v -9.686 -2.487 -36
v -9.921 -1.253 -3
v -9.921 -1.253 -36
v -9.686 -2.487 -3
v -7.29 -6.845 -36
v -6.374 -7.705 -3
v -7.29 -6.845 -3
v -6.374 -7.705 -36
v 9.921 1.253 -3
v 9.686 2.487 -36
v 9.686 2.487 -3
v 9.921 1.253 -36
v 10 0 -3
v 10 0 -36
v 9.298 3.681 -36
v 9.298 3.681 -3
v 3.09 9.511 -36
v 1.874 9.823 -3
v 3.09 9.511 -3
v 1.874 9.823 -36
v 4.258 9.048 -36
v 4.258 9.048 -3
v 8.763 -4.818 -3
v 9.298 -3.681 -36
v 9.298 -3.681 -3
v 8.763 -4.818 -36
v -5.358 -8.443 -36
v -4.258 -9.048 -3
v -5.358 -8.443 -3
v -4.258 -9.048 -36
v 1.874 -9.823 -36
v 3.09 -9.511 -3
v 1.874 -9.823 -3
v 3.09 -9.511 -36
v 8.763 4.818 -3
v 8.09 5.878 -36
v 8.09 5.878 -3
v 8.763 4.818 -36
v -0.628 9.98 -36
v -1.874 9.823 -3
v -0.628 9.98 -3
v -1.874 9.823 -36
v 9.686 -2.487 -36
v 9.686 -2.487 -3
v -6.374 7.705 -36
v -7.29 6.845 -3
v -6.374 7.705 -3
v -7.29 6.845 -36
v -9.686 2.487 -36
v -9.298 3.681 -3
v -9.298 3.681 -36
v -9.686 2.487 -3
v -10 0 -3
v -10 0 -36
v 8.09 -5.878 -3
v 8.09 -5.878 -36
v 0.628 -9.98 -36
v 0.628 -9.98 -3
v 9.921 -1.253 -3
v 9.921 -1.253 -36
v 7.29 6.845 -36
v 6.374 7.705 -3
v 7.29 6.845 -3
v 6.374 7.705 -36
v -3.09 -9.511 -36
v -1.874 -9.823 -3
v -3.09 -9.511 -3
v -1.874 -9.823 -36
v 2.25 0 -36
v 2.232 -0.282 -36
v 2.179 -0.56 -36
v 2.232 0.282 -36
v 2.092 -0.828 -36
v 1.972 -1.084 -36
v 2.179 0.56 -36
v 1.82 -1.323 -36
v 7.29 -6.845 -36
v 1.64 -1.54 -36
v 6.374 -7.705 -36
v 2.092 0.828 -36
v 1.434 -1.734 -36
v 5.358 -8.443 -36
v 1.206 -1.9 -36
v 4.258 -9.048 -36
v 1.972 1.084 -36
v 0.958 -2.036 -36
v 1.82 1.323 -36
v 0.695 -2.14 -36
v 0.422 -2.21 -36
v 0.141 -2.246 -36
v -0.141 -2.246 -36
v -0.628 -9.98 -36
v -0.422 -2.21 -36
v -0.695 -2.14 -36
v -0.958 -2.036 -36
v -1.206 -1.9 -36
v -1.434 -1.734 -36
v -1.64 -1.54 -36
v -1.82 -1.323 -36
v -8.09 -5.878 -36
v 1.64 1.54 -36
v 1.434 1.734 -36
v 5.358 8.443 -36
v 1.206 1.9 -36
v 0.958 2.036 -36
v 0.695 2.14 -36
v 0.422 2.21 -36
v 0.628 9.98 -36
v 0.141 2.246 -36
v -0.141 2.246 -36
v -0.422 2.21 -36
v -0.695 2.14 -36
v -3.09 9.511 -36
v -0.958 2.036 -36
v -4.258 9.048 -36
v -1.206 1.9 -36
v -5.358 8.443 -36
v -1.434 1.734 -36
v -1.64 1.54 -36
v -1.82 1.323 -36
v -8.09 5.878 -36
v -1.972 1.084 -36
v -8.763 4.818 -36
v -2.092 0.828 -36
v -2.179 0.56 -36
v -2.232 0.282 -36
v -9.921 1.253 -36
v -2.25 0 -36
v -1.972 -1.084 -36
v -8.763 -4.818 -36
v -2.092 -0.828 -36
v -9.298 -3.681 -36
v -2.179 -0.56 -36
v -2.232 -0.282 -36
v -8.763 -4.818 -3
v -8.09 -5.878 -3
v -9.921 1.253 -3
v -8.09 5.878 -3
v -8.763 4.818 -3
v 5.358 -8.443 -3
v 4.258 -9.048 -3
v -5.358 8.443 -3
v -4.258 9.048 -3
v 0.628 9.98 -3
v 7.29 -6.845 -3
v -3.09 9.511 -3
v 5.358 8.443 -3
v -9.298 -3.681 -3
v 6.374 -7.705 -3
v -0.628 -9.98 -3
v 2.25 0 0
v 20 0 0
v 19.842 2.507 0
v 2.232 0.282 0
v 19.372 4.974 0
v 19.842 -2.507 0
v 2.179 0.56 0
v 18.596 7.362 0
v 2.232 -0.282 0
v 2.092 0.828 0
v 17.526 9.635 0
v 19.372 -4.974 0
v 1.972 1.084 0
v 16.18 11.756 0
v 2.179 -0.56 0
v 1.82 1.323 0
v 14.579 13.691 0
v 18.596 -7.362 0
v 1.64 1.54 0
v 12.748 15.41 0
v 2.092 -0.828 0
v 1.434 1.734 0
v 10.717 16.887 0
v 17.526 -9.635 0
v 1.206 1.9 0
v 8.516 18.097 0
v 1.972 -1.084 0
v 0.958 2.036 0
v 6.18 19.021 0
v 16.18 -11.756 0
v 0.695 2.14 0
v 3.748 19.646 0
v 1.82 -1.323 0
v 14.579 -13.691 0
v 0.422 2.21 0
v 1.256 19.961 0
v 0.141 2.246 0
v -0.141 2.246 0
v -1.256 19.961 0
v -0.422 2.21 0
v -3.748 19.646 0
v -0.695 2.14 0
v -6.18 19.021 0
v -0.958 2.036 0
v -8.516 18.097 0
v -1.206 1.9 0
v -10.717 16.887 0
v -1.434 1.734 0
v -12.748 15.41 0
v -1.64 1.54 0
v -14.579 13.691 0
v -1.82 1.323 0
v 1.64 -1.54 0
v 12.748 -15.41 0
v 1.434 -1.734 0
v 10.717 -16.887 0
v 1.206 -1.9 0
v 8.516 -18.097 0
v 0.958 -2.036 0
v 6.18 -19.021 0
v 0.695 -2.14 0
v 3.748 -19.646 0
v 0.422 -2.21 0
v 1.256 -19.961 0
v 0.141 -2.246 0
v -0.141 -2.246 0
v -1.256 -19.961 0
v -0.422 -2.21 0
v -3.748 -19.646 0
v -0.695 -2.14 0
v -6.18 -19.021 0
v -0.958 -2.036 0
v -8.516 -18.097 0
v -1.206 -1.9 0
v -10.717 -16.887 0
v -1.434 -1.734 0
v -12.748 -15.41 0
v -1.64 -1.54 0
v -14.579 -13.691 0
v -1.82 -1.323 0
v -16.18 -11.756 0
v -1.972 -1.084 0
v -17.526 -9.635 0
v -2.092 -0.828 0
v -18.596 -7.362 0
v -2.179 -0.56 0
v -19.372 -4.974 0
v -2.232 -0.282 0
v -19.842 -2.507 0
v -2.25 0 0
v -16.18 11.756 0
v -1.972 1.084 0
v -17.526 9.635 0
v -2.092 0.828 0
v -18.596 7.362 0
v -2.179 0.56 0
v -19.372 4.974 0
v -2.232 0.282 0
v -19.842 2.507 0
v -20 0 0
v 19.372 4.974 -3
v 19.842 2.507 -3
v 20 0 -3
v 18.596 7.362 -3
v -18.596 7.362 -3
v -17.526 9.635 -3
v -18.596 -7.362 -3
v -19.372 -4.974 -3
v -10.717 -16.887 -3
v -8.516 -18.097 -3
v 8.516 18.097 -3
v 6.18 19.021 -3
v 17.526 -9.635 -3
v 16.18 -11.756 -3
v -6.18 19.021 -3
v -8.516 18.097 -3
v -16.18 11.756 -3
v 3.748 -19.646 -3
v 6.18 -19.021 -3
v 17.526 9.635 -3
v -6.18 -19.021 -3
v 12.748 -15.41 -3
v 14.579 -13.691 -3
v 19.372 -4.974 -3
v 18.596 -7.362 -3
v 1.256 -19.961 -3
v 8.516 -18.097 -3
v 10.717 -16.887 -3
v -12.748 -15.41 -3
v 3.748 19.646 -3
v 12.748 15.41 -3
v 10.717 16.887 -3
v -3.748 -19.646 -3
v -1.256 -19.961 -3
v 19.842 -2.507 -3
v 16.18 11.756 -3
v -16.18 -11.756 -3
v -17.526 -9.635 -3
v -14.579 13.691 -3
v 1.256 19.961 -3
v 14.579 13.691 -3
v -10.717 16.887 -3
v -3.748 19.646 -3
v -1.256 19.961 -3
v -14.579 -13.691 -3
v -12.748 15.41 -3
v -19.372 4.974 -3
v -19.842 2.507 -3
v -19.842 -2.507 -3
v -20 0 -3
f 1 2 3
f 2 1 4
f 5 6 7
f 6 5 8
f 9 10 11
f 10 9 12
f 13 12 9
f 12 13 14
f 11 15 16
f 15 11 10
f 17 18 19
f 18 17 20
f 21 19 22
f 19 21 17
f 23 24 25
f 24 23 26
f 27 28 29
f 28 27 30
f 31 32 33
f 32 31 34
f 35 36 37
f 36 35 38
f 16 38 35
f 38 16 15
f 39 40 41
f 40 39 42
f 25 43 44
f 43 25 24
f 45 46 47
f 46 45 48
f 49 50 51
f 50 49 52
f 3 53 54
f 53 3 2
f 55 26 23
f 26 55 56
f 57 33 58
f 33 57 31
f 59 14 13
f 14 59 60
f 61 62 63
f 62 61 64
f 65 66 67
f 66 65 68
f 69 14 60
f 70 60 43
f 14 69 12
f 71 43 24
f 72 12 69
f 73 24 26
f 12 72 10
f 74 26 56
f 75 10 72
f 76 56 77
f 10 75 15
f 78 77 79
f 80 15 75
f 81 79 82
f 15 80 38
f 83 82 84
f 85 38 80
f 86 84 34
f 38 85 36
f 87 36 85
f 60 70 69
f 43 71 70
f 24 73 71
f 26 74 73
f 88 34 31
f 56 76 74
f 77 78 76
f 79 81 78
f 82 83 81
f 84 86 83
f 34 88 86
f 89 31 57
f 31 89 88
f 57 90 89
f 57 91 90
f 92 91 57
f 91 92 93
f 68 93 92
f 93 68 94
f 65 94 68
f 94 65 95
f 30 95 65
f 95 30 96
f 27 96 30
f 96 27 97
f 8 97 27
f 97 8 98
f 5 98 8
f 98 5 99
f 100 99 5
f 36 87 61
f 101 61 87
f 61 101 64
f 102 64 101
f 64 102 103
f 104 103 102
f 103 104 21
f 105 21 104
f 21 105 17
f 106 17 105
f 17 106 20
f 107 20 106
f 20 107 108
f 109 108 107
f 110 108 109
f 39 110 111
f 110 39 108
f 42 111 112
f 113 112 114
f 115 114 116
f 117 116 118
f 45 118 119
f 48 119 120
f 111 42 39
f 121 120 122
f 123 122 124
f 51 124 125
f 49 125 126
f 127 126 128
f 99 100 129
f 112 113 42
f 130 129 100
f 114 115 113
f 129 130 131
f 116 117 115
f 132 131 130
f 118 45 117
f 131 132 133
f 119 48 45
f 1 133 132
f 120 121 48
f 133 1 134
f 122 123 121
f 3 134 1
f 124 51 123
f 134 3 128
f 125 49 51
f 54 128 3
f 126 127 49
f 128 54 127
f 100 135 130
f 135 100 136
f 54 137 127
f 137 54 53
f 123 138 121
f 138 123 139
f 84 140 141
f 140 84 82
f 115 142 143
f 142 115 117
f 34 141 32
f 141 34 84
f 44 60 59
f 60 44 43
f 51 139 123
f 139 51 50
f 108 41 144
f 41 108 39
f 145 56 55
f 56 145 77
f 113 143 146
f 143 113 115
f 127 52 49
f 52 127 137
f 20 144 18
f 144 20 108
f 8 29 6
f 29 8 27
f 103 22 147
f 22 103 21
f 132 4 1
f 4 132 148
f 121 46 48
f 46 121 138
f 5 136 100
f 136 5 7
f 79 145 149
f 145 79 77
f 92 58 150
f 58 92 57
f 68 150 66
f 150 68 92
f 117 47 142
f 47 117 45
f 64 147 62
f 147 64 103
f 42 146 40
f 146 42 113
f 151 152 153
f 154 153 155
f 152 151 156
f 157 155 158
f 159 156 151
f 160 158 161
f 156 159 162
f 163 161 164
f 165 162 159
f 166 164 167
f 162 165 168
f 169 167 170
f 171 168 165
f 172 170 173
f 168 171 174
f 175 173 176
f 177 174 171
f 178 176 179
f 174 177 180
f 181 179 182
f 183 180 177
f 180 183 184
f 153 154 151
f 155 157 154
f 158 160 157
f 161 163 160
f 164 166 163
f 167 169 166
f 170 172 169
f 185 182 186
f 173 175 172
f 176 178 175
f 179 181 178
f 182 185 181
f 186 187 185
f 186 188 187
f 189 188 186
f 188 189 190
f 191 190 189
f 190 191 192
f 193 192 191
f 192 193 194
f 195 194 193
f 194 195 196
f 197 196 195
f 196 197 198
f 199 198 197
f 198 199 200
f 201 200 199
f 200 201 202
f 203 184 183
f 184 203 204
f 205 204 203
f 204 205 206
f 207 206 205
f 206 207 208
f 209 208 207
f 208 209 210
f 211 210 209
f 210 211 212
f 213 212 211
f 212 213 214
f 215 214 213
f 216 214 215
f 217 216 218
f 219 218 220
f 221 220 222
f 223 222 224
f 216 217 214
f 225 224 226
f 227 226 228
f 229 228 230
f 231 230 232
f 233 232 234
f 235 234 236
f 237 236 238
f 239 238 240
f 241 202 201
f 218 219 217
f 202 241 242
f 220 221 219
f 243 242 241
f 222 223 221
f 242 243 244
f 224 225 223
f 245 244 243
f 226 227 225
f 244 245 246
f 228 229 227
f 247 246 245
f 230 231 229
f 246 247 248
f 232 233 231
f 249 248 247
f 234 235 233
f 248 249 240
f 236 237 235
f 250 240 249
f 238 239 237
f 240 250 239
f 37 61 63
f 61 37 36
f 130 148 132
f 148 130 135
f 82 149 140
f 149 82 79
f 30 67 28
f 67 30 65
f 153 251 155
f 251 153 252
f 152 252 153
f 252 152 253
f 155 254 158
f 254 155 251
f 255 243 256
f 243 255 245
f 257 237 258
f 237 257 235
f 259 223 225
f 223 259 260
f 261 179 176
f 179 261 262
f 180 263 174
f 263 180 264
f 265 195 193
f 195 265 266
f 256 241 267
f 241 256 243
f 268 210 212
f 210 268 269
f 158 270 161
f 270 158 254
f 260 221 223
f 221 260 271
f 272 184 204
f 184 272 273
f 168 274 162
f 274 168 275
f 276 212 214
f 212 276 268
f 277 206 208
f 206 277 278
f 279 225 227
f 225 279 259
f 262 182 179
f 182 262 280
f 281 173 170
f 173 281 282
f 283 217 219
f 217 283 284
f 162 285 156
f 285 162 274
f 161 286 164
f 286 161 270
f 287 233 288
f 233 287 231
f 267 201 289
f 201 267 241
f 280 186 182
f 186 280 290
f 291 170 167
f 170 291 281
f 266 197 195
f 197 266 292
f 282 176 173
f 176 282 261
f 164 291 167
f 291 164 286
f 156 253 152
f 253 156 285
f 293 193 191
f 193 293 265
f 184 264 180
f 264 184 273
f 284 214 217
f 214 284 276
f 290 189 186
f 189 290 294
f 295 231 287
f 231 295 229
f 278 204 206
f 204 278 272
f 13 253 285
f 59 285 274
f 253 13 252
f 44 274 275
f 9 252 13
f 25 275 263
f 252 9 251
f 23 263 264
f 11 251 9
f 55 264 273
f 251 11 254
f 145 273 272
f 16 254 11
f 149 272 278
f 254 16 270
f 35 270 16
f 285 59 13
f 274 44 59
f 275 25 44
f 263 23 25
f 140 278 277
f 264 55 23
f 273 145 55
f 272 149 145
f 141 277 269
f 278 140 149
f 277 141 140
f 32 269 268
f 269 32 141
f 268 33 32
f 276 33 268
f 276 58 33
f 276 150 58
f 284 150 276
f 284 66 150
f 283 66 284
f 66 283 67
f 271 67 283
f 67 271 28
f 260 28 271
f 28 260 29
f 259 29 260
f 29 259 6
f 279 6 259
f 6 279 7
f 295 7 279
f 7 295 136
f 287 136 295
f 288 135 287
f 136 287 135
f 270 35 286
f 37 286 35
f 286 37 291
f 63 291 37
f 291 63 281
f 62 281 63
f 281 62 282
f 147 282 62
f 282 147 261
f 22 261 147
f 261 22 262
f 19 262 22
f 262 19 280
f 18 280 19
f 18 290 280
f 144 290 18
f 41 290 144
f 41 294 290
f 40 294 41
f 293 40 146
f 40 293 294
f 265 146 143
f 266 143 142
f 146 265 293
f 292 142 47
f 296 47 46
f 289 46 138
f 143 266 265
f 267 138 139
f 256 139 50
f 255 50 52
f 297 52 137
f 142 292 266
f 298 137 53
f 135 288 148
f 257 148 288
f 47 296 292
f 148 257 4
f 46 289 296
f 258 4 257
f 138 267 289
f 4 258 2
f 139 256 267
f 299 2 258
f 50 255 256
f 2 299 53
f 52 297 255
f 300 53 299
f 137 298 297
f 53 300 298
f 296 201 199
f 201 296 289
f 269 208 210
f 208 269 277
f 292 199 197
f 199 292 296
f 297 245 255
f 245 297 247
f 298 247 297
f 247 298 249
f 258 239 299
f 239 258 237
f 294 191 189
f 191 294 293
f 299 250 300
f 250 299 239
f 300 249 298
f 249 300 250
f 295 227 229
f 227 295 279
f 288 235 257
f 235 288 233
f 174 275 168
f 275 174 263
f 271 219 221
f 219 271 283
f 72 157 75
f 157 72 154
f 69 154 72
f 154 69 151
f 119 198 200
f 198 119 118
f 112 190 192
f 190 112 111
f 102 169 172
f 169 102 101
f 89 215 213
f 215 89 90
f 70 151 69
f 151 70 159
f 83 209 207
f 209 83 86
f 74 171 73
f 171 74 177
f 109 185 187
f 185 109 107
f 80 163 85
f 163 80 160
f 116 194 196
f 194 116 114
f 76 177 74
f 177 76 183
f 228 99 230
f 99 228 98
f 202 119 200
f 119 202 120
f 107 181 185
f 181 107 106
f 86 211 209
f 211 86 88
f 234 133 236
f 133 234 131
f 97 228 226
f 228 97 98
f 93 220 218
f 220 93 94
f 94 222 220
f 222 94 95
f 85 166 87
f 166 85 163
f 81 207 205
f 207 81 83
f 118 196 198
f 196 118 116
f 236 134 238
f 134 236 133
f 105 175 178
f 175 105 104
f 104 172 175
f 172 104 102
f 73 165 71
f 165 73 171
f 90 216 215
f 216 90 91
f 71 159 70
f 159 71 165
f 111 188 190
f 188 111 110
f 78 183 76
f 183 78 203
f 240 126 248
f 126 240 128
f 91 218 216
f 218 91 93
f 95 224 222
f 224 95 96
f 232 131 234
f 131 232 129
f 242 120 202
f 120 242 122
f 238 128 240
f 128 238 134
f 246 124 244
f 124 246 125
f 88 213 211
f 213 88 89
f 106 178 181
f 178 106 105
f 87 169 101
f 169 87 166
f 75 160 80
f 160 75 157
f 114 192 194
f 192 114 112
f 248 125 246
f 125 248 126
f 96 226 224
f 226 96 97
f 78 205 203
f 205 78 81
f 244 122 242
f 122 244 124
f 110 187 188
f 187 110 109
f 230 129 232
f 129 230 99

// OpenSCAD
$fn = 50;


difference() {
	union() {
		translate(v = [0, 0, -36.0000000000]) {
			cylinder(h = 36, r = 10.0000000000);
		}
		translate(v = [0, 0, -3.0000000000]) {
			cylinder(h = 3, r = 20.0000000000);
		}
	}
	union() {
		#translate(v = [0, 0, -36]) {
			cylinder(h = 36, r = 2.2500000000);
		}
	}
}
